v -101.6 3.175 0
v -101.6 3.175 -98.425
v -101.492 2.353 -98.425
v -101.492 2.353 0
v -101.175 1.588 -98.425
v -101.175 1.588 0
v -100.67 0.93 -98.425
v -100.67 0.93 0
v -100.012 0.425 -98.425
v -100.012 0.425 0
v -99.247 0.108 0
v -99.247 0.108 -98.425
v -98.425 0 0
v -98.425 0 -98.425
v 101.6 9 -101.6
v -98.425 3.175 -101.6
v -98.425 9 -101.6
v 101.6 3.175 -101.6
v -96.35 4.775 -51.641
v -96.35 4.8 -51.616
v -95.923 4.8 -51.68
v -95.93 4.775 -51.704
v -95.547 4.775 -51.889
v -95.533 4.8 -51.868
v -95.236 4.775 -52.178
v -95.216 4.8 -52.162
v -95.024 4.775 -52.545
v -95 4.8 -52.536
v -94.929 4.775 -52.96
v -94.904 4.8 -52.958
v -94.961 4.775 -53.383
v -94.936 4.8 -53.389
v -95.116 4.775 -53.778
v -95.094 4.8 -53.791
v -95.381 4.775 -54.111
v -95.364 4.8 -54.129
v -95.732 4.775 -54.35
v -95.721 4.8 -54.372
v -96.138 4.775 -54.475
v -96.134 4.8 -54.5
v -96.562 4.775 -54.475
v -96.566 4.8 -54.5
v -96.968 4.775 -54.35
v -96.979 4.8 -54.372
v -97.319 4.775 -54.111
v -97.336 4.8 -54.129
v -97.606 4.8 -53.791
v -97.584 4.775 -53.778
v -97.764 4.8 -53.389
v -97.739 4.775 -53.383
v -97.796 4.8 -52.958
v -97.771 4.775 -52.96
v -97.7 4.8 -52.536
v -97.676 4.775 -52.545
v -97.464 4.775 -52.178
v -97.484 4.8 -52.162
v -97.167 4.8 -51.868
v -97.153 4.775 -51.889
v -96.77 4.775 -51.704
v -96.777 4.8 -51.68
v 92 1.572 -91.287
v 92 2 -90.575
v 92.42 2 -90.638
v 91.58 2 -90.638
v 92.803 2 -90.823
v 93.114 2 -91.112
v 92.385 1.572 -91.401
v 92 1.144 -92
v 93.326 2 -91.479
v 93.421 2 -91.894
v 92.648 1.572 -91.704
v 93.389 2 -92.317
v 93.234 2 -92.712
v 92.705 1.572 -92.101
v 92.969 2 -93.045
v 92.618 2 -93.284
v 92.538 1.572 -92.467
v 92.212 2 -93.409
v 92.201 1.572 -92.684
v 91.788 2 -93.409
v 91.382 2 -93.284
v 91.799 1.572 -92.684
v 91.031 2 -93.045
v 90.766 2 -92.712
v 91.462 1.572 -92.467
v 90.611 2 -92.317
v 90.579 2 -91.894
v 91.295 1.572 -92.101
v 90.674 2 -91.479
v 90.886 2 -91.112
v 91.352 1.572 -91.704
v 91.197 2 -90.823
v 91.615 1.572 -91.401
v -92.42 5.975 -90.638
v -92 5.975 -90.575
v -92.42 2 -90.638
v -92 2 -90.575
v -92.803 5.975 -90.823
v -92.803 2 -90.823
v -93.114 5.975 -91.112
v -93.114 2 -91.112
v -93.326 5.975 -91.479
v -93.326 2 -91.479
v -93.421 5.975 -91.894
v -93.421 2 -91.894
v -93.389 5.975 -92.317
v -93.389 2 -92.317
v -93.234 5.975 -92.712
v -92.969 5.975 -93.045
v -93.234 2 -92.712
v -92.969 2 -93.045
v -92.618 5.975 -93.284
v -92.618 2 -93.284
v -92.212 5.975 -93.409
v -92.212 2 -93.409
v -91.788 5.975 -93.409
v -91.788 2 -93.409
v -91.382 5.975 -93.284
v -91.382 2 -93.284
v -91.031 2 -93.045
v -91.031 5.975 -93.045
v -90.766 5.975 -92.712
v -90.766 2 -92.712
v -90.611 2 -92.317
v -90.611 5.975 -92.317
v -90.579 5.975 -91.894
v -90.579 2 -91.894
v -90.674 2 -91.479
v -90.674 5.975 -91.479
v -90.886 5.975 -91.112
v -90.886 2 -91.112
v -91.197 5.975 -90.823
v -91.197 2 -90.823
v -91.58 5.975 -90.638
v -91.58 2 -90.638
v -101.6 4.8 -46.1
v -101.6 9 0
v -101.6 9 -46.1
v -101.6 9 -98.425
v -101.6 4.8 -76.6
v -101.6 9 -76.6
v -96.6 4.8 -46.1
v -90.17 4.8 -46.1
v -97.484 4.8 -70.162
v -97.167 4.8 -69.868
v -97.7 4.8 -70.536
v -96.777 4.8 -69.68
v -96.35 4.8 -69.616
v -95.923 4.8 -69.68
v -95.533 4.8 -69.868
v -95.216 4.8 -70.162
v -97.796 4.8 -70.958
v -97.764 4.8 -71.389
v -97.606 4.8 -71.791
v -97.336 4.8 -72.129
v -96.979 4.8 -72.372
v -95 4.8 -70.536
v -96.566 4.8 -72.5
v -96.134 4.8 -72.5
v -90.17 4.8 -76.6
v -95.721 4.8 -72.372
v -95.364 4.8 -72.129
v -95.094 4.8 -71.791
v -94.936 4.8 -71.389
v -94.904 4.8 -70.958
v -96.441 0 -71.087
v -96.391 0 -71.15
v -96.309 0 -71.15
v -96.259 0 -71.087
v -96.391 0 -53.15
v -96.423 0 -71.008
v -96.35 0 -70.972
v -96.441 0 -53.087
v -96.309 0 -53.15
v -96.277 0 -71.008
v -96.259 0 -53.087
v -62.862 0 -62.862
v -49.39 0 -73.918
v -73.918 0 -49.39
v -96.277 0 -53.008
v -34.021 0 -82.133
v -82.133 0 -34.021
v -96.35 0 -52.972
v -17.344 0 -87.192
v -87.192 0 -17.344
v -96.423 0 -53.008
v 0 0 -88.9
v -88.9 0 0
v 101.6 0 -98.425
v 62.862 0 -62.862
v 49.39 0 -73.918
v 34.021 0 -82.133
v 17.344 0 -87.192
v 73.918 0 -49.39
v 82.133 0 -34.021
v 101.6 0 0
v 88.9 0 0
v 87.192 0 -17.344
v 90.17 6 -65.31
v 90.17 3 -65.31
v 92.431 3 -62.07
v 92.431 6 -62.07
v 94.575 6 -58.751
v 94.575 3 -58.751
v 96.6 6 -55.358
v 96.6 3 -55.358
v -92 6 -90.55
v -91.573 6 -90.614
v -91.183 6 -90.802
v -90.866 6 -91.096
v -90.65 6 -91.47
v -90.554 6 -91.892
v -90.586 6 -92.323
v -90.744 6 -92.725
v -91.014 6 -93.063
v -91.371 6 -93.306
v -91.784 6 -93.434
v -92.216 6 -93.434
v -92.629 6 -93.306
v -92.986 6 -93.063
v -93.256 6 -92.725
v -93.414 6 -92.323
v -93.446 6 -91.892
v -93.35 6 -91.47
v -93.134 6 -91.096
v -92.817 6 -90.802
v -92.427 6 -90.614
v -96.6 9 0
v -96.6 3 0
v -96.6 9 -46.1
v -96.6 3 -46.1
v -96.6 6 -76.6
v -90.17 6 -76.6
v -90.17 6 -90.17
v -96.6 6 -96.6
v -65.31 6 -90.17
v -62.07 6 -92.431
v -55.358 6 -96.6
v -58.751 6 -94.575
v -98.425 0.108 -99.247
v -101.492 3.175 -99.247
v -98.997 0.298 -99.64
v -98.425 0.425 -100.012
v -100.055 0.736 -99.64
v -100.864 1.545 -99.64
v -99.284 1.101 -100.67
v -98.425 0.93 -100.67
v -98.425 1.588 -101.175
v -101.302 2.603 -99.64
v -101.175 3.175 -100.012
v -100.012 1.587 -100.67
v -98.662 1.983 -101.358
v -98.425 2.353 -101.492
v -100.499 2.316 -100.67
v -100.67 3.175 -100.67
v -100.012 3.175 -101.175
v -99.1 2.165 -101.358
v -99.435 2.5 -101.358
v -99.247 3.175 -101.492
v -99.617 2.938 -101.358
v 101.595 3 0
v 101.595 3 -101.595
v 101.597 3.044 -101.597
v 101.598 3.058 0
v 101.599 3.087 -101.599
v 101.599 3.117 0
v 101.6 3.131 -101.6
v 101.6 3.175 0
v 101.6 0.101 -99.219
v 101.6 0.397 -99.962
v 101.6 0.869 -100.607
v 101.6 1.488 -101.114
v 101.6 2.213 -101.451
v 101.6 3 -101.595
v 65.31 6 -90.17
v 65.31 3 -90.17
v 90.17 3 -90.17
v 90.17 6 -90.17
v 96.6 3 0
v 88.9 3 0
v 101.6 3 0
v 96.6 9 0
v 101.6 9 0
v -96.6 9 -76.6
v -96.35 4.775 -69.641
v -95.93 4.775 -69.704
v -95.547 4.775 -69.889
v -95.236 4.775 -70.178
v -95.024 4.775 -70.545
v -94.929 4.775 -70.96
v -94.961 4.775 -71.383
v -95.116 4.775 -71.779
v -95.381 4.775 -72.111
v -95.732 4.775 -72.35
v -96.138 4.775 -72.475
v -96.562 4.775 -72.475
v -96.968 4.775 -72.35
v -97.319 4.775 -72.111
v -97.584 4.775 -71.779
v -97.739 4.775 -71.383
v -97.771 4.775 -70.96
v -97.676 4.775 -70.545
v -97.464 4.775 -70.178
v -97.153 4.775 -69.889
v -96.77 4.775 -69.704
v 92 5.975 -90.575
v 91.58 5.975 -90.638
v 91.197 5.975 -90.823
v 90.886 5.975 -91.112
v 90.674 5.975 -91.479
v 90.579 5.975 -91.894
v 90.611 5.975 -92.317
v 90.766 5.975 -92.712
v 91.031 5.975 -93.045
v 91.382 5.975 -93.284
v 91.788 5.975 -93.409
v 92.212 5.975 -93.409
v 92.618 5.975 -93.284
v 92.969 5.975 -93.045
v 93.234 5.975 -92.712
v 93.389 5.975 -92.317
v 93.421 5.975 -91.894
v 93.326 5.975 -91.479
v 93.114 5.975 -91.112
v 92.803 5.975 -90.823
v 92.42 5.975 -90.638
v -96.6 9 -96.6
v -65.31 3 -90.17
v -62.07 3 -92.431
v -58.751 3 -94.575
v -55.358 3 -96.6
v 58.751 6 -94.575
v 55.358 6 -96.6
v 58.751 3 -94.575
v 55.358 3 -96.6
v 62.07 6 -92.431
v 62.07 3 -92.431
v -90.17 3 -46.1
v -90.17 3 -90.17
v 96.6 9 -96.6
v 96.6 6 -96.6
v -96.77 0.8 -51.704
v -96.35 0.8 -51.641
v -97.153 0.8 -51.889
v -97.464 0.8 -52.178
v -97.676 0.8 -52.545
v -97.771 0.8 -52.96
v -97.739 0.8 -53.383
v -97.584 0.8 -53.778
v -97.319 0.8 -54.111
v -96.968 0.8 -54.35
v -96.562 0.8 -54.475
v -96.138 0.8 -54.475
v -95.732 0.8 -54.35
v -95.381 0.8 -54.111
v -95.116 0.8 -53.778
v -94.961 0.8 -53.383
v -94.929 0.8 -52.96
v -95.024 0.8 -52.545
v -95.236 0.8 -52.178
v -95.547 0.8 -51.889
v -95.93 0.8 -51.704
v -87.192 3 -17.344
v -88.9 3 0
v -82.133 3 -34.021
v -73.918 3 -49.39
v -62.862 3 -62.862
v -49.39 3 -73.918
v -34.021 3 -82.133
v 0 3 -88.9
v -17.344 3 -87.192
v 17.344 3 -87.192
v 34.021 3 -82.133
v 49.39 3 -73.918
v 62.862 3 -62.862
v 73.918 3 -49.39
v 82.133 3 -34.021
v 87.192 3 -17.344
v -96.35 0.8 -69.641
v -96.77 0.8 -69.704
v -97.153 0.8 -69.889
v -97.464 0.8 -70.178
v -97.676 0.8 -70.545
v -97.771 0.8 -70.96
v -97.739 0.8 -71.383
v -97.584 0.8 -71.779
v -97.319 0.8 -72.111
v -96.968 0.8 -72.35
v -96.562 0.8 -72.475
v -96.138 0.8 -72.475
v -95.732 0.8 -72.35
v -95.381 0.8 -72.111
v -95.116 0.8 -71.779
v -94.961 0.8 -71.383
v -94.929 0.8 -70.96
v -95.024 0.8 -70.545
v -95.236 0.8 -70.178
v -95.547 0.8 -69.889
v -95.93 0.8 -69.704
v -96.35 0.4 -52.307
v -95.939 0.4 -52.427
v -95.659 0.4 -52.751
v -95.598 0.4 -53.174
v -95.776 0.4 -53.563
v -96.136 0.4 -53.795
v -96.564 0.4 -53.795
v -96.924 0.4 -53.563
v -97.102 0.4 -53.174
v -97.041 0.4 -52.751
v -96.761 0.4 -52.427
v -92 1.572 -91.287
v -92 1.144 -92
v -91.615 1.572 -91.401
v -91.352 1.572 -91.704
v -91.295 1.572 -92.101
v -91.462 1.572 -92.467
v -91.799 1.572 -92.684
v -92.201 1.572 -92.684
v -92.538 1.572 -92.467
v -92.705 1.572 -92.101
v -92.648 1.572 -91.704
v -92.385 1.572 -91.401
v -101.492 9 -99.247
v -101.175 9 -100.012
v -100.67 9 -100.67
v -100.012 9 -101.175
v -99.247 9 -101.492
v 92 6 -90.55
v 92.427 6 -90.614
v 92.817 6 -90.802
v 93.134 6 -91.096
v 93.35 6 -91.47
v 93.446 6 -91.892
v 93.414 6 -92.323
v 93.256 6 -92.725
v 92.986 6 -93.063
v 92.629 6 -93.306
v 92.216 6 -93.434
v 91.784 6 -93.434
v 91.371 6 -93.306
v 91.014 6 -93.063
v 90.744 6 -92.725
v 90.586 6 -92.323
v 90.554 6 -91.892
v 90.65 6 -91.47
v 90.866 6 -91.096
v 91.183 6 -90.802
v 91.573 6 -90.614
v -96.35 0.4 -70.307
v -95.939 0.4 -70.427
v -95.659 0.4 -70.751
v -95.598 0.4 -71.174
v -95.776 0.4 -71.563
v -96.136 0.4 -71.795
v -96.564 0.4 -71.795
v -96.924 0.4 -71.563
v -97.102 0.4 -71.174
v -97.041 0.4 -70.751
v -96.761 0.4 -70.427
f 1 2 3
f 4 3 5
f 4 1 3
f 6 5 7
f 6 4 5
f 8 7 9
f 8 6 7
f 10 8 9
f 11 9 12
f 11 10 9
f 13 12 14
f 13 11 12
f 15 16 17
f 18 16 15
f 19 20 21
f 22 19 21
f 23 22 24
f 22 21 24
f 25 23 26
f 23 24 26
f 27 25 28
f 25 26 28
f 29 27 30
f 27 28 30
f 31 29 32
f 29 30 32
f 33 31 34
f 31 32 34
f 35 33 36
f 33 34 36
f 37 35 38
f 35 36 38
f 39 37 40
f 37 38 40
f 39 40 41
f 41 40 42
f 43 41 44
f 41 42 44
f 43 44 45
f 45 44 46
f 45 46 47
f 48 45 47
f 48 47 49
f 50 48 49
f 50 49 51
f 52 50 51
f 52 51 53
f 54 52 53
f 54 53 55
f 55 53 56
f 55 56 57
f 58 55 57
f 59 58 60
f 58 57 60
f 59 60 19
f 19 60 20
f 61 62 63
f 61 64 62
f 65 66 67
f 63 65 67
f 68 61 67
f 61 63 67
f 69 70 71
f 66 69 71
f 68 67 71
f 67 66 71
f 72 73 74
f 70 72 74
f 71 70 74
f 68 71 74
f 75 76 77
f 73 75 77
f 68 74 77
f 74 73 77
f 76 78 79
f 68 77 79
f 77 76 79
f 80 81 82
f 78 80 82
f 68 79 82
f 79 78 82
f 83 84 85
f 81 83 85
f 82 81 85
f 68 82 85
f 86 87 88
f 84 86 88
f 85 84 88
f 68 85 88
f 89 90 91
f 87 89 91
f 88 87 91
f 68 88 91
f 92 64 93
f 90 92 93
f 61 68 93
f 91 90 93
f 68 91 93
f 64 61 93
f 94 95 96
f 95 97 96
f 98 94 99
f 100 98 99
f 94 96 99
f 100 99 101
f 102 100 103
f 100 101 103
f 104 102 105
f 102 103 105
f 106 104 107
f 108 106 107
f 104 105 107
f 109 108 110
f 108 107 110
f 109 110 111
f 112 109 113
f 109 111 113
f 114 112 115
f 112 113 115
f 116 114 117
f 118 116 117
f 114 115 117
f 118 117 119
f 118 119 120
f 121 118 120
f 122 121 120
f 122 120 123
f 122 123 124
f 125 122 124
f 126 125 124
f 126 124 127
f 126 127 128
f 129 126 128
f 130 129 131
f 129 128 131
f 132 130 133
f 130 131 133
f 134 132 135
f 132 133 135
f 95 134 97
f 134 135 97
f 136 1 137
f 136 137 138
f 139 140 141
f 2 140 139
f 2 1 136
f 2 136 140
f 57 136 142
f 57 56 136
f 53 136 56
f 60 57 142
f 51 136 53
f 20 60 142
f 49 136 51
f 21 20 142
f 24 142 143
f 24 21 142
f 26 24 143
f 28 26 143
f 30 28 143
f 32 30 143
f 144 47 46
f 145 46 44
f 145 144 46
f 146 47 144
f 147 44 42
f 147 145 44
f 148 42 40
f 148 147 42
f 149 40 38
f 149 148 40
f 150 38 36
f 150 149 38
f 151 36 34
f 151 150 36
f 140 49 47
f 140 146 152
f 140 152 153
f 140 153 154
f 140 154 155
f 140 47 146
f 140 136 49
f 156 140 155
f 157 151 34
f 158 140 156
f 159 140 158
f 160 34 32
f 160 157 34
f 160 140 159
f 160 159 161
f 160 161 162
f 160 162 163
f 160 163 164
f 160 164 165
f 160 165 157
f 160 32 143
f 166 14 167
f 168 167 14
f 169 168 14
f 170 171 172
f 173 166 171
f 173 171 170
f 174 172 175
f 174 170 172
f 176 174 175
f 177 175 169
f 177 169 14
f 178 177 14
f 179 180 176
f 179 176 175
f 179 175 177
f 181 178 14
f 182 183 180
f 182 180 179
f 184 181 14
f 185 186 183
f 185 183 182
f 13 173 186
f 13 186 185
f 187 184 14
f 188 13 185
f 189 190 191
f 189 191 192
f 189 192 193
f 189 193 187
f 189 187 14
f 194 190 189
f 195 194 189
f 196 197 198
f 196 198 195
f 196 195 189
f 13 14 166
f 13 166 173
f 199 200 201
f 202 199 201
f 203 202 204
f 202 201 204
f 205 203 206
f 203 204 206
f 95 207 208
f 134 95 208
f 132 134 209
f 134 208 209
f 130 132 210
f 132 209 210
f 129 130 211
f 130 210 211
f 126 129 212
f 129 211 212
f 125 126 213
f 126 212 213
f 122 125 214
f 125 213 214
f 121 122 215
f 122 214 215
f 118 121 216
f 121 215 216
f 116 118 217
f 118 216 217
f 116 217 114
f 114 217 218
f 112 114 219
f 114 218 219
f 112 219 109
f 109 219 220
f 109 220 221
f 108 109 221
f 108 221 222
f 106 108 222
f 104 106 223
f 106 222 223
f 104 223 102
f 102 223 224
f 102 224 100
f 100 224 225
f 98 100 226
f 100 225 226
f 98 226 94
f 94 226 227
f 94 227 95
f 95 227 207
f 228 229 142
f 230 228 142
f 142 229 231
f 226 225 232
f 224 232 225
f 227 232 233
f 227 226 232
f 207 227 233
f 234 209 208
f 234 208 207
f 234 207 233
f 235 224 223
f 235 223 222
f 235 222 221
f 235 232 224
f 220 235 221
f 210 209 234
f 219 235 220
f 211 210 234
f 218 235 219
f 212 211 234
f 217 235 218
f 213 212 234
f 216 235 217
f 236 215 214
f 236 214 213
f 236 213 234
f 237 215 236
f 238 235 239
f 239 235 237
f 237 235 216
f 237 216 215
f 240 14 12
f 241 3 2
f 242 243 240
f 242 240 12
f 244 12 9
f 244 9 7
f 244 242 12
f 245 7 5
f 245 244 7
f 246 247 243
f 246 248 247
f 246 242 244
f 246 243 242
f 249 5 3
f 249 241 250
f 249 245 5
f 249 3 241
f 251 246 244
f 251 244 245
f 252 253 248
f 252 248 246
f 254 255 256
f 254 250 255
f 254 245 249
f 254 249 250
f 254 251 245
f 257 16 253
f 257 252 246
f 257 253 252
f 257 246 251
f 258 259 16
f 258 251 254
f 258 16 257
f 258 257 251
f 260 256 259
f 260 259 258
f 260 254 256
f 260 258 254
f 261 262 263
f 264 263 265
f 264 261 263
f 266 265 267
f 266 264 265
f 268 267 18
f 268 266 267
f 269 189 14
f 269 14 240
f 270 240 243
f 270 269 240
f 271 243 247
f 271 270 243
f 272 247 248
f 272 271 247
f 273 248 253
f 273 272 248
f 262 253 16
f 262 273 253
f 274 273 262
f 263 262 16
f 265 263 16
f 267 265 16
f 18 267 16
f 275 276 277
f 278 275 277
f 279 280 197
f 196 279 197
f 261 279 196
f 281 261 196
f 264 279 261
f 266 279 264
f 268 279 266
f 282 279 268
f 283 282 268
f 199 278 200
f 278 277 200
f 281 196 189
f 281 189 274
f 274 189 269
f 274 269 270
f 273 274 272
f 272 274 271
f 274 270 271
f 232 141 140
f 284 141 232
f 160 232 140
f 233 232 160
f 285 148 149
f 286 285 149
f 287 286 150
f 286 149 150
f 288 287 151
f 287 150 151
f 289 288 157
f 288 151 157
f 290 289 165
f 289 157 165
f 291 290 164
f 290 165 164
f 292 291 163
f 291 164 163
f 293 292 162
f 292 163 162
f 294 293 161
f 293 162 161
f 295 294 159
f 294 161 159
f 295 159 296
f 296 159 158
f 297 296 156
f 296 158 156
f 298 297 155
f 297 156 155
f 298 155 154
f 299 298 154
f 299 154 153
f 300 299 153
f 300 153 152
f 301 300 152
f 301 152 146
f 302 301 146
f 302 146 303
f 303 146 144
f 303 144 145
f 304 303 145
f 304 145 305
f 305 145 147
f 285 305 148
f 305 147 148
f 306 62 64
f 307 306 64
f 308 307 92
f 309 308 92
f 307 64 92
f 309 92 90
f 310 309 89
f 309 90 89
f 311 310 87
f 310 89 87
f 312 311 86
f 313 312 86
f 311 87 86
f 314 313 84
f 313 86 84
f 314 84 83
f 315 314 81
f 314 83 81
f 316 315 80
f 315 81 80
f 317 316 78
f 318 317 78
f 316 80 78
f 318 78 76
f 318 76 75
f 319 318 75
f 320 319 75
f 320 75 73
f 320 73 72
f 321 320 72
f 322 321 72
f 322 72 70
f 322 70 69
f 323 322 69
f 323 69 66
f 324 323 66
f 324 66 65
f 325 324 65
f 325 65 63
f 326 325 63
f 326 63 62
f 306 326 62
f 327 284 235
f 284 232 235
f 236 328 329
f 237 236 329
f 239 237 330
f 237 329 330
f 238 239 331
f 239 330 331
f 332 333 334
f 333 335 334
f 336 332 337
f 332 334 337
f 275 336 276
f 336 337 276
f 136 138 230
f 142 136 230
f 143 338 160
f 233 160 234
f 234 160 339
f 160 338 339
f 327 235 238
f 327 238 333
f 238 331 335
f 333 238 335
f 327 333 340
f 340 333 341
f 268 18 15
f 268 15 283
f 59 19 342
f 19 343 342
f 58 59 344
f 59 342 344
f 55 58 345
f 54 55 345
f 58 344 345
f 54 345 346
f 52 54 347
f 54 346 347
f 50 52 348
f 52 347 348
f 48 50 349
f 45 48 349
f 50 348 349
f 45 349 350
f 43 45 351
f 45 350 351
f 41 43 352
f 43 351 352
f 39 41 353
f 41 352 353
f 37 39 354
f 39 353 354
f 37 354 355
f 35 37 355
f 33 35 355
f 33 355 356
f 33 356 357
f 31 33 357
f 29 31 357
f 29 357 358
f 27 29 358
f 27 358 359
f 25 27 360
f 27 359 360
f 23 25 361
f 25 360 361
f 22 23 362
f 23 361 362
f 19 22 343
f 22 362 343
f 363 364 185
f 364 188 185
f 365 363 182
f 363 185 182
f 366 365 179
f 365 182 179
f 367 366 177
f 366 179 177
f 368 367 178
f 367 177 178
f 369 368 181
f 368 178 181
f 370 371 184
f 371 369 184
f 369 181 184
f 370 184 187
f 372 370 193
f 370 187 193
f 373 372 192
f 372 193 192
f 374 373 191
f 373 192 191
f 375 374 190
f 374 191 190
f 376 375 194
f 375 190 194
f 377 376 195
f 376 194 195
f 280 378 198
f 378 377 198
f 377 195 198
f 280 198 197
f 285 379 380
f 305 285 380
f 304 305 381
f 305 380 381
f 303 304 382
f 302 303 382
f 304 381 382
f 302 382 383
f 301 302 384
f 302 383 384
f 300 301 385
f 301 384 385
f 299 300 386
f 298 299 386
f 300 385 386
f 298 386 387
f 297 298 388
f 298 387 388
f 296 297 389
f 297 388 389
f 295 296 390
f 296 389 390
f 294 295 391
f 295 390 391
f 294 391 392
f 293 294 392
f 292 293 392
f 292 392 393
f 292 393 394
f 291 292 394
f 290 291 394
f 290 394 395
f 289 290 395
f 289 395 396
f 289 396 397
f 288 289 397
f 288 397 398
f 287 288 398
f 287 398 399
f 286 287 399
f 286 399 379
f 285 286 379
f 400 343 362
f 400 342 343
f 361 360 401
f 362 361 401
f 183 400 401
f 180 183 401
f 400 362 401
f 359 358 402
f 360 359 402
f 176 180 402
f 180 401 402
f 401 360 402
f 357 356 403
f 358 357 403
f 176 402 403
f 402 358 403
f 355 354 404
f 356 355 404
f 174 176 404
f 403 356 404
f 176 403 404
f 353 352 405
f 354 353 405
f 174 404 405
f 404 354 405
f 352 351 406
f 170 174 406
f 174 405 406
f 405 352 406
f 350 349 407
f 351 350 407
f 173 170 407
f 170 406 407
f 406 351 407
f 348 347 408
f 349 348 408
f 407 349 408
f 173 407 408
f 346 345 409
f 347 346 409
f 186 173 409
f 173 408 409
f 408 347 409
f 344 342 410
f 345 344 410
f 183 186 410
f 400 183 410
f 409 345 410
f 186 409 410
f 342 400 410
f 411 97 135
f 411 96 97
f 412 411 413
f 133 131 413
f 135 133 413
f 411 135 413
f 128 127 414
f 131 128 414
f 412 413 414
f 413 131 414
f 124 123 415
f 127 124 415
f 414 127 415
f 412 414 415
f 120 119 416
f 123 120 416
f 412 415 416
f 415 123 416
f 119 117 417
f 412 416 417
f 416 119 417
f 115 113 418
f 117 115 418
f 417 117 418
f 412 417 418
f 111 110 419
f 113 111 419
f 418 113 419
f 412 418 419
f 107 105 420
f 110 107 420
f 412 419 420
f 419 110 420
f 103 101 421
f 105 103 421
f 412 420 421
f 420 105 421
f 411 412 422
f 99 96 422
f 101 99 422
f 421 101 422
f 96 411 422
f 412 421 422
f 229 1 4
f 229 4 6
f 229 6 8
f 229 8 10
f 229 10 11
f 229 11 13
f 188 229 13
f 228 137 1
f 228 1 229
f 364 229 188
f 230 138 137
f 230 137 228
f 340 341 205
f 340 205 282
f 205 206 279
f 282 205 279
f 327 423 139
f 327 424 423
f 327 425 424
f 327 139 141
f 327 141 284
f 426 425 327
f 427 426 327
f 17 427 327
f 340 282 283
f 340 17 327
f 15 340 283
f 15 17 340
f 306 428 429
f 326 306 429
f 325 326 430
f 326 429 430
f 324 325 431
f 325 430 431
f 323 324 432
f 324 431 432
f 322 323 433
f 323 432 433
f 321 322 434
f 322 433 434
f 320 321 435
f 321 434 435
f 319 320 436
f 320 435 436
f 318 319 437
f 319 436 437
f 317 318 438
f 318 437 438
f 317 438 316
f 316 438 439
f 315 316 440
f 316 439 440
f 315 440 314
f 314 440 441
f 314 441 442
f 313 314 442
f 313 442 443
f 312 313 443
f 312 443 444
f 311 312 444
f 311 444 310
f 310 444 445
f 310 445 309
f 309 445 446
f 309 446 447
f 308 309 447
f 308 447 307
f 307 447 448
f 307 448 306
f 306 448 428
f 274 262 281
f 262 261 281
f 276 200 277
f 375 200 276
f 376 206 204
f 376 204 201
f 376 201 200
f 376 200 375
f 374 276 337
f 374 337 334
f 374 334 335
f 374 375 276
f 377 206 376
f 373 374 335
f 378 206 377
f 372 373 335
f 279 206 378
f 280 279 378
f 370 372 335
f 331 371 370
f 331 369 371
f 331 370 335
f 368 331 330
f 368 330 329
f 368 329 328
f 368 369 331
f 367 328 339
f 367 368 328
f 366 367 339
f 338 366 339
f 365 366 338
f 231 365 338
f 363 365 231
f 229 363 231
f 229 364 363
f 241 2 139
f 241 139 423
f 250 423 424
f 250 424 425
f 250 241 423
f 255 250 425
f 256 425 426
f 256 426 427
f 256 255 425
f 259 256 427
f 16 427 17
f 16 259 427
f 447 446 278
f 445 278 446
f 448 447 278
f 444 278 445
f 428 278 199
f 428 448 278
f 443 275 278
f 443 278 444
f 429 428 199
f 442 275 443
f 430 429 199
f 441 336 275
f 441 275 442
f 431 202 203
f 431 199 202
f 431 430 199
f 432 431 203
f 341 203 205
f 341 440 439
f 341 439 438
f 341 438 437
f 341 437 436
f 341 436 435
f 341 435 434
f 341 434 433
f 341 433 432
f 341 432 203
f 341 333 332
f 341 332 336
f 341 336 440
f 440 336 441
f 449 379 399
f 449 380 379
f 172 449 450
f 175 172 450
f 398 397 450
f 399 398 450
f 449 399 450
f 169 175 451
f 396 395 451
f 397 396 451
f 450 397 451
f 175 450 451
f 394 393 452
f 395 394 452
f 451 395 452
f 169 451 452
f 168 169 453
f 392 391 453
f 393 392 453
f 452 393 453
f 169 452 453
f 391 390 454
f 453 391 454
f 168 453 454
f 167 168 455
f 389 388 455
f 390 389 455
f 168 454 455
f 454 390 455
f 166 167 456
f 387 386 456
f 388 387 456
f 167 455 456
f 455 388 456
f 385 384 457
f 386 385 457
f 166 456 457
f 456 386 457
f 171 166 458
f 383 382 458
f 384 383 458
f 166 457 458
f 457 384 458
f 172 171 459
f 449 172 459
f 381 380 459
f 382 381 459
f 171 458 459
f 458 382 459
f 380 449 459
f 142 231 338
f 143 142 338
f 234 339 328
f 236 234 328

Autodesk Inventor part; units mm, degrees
ref_plane "YZ Plane" through (0, 0, 0) normal (1, 0, 0) x (0, 1, 0)
ref_plane "XZ Plane" through (0, 0, 0) normal (0, 1, 0) x (-1, 0, 0)
ref_plane "XY Plane" through (0, 0, 0) normal (0, 0, 1) x (1, 0, 0)
sketch "Sketch1" plane through (0, 0, 0) normal (0, 1, 0) x (-1, 0, 0)
  line L0 (101.6, -101.6) -> (-101.6, -101.6)
  line L1 (-101.6, -101.6) -> (-101.6, 101.6)
  line L2 (-101.6, 101.6) -> (101.6, 101.6)
  line L3 (101.6, 101.6) -> (101.6, -101.6)
  line L4 (96.6, -96.6) -> (-96.6, -96.6)
  line L5 (-96.6, -96.6) -> (-96.6, 96.6)
  line L6 (-96.6, 96.6) -> (96.6, 96.6)
  line L7 (96.6, 96.6) -> (96.6, -96.6)
  line L8 (101.6, 101.6) -> (-40.4, 101.6)
  circle A0 centre (0, 0) radius 88.9
  circle A1 centre (0, 0) radius 109.3376
  line L9 (-40.4, 101.6) -> (-101.6, 40.4)
  line L10 (-45.4, 101.6) -> (-101.6, 45.4)
  line L11 (96.6, 96.6) -> (96.6, 101.6)
  line L12 (-45.4, 101.6) -> (-35.4, 101.6)
  line L13 (-35.4, 101.6) -> (-35.4, 96.6)
  line L14 (-35.4, 96.6) -> (-45.4, 96.6)
  line L15 (-45.4, 96.6) -> (-45.4, 101.6)
  circle A2 centre (0, 0) radius 111.3376
  point P0 (96.6, 51.2168)
  point P1 (101.6, 40.4)
  point P2 (101.6, -40.4)
  point P3 (96.6, -51.2168)
  point P4 (-96.6, 45.4)
  point P5 (-45.4, 96.6)
  dimension "d0" = 203.2
  dimension "d1" = 203.2
  dimension "d2" = 101.6
  dimension "d3" = 101.6
  dimension "d4" = 5
  dimension "d5" = 5
  dimension "d6" = 5
  dimension "d7" = 5
  dimension "d10" = 142
  dimension "d12" = 61.2
  dimension "d14" = 177.8
  dimension "d15" = 5
  dimension "d16" = 5
  dimension "d17" = 10
  dimension "d34" = 2
extrude "Extrusion1" add sketch "Sketch1" along normal blind 3 contours L0 A2 L4 L7 L3 | L0 A1 L4 A2 | A2 L7 A1 L3 | L0 A1 L4 | A2 L4 A1 L0 | L0 L1 A2 L5 L4 | A2 L7 L4 | L4 A1 L7 A2 | A1 L7 L3 | L4 A1 L5 L9 L6 L7 | A2 L5 A1 L4 | L4 L5 A2 | A1 L7 A2 L3 | A2 L7 L11 L2 L3 | L1 A1 L5 A2 | A1 L6 A2 L7 | A2 L6 L7 | A1 L1 L9 L5 | A1 L2 A2 L6 | L6 L13 L2 A1 | L11 L6 A2 L2 | L9 A1 L10 L5 | L5 L10 L6 L9 | L1 L10 A1 | L6 L9 L2 L13 | L15 A1 L9 | L6 L10 A1 L15 | A1 L15 L2 | A1 L10 L15
sketch "Sketch5" plane through (0, 3, 0) normal (0, 1, 0) x (1, 0, 0)
  line L0 (-101.6, 101.6) -> (101.6, 101.6)
  line L1 (101.6, 101.6) -> (101.6, -101.6)
  line L2 (101.6, -101.6) -> (-101.6, -101.6)
  line L3 (-101.6, -101.6) -> (-101.6, 101.6)
  line L4 (-96.6, 96.6) -> (96.6, 96.6)
  line L5 (96.6, 96.6) -> (96.6, -96.6)
  line L6 (96.6, -96.6) -> (-96.6, -96.6)
  line L7 (-96.6, -96.6) -> (-96.6, 96.6)
  line L8 (-101.6, -101.6) -> (40.4, -101.6)
  circle A0 centre (0, 0) radius 88.9
  circle A1 centre (0, 0) radius 109.3376
  line L9 (40.4, -101.6) -> (101.6, -40.4)
  line L10 (45.4, -101.6) -> (101.6, -45.4)
  line L11 (-96.6, -96.6) -> (-96.6, -101.6)
  line L12 (45.4, -101.6) -> (35.4, -101.6)
  line L13 (35.4, -101.6) -> (35.4, -96.6)
  line L14 (35.4, -96.6) -> (45.4, -96.6)
  line L15 (45.4, -96.6) -> (45.4, -101.6)
  circle A2 centre (0, 0) radius 111.3376
  point P0 (96.6, 101.6)
  point P1 (96.6, 51.2168)
  point P2 (101.6, 40.4)
  point P3 (101.6, -40.4)
  point P4 (96.6, -51.2168)
  point P5 (-96.6, 45.4)
  point P6 (-45.4, 96.6)
  point P7 (-35.4, 101.6)
  point P8 (-55.358, -96.6)
  point P9 (-96.6, -55.358)
  point P10 (-96.6, 55.358)
  point P11 (-55.358, 96.6)
  point P12 (55.358, 96.6)
  point P13 (96.6, 55.358)
  point P14 (96.6, -45.4)
  point P15 (45.4, -96.6)
  dimension "d37" = 203.2
  dimension "d38" = 203.2
  dimension "d39" = 101.6
  dimension "d40" = 101.6
  dimension "d41" = 5
  dimension "d42" = 5
  dimension "d43" = 5
  dimension "d44" = 5
  dimension "d45" = 142
  dimension "d46" = 61.2
  dimension "d47" = 177.8
  dimension "d48" = 5
  dimension "d49" = 5
  dimension "d50" = 10
  dimension "d51" = 2
extrude "Extrusion4" add sketch "Sketch5" along normal blind 3 contours L0 A2 L4 L7 L3 | L0 A1 L4 A2 | A2 L7 A1 L3 | L0 A1 L4 | A2 L4 A1 L0 | L0 L1 A2 L5 L4 | A2 L7 L4 | A1 L7 L3 | A2 L7 L11 L2 L3 | L3 A1 L7 A2 | L4 L5 A2 | A2 L6 L7 | L1 A1 L5 A2 | L11 L6 A2 L2 | L6 A1 L2 A2 | A1 L1 L9 L5 | L6 L13 L2 A1 | L9 A1 L10 L5 | L5 L10 L6 L9 | L1 L10 A1 | L6 L9 L2 L13 | L15 A1 L9 | L6 L10 A1 L15 | A1 L15 L2 | L15 A1 L10
sketch "Sketch6" plane through (0, 6, 0) normal (0, 1, 0) x (1, 0, 0)
  line L0 (-101.6, 101.6) -> (101.6, 101.6)
  line L1 (101.6, 101.6) -> (101.6, -101.6)
  line L2 (101.6, -101.6) -> (-101.6, -101.6)
  line L3 (-101.6, -101.6) -> (-101.6, 101.6)
  line L4 (-96.6, 96.6) -> (96.6, 96.6)
  line L5 (96.6, 96.6) -> (96.6, -96.6)
  line L6 (96.6, -96.6) -> (-96.6, -96.6)
  line L7 (-96.6, -96.6) -> (-96.6, 96.6)
  line L8 (-101.6, -101.6) -> (40.4, -101.6)
  circle A0 centre (0, 0) radius 88.9
  circle A1 centre (0, 0) radius 109.3376
  line L9 (40.4, -101.6) -> (101.6, -40.4)
  line L10 (45.4, -101.6) -> (101.6, -45.4)
  line L11 (-96.6, -96.6) -> (-96.6, -101.6)
  line L12 (45.4, -101.6) -> (35.4, -101.6)
  line L13 (35.4, -101.6) -> (35.4, -96.6)
  line L14 (35.4, -96.6) -> (45.4, -96.6)
  line L15 (45.4, -96.6) -> (45.4, -101.6)
  circle A2 centre (0, 0) radius 111.3376
  point P0 (96.6, 101.6)
  point P1 (96.6, 51.2168)
  point P2 (101.6, 40.4)
  point P3 (101.6, -40.4)
  point P4 (96.6, -51.2168)
  point P5 (-96.6, 45.4)
  point P6 (-45.4, 96.6)
  point P7 (-35.4, 101.6)
  point P8 (55.358, 96.6)
  point P9 (96.6, 55.358)
  point P10 (96.6, -45.4)
  point P11 (45.4, -96.6)
  dimension "d54" = 203.2
  dimension "d55" = 203.2
  dimension "d56" = 101.6
  dimension "d57" = 101.6
  dimension "d58" = 5
  dimension "d59" = 5
  dimension "d60" = 5
  dimension "d61" = 5
  dimension "d62" = 142
  dimension "d63" = 61.2
  dimension "d64" = 177.8
  dimension "d65" = 5
  dimension "d66" = 5
  dimension "d67" = 10
  dimension "d68" = 2
extrude "Extrusion5" add sketch "Sketch6" along normal blind 3 contours L0 A2 L4 L7 L3 | L0 A1 L4 A2 | A2 L7 A1 L3 | L0 A1 L4 | A2 L4 A1 L0 | L0 L1 A2 L5 L4 | A1 L7 L3 | A2 L7 L11 L2 L3 | L3 A1 L7 A2 | L1 A1 L5 A2 | L11 L6 A2 L2 | L6 A1 L2 A2 | A1 L1 L9 L5 | L6 L13 L2 A1 | L9 A1 L10 L5 | L5 L10 L6 L9 | L1 L10 A1 | L6 L9 L2 L13 | L15 A1 L9 | L6 L10 A1 L15 | A1 L15 L2 | L15 A1 L10
fillet "Fillet6" radius 3.175 5 edges at (-28.1, 0, 101.6) (73.5, 0, 73.5) (101.6, 0, -28.1) (0, 0, -101.6) (-101.6, 0, 0)
sketch "Sketch7" plane through (0, 0, 0) normal (0, -1, 0) x (1, 0, 0)
  line L0 (101.6, 45.4) -> (101.6, -101.6) projected
  line L1 (98.425, 44.0849) -> (98.425, -98.425) projected
  line L2 (101.6, -101.6) -> (98.425, -101.6)
  line L3 (98.425, -101.6) -> (98.425, 41.0849)
  line L4 (98.425, 41.0849) -> (101.6, 41.0849)
  line L5 (101.6, 41.0849) -> (101.6, -101.6)
  line L6 (44.0849, 98.425) -> (98.425, 44.0849) projected
  line L7 (98.425, 44.0849) -> (101.6, 44.0849)
  point P0 (0, 0)
  point P1 (101.6, 41.0849)
  dimension "d73" = 3
extrude "Extrusion6" add sketch "Sketch7" against normal blind 3 contours L0 L2 L3 L1 L4
fillet "Fillet7" radius 3.175 1 edges at (100.0125, 0, -101.6)
fillet "Fillet8" radius 3.175 4 edges at (-100.6701, 0.9299, 100.6701) (-101.6, 6.0875, 101.6) (-100.6701, 0.9299, -100.6701) (-101.6, 6.0875, -101.6)
fillet "Fillet9" radius 3.175 4 edges at (100.6701, 0.9299, 45.0148) (101.6, 6.0875, 45.4) (45.0148, 0.9299, 100.6701) (45.4, 6.0875, 101.6)
sketch "Sketch11" plane through (0, 3, 0) normal (0, 1, 0) x (1, 0, 0)
  arc A0 (-101.6, -98.425) -> (-98.425, -101.6) centre (-98.425, -98.425) ccw
  line L0 (44.0849, 101.6) -> (-98.425, 101.6)
  line L1 (-101.6, 98.425) -> (-101.6, -98.425)
  line L2 (-101.6, -46.1) -> (-101.6, -76.6)
  line L3 (-96.6, -96.6) -> (-96.6, 96.6)
  line L4 (-96.6, -46.1) -> (-96.6, -76.6)
  line L5 (-101.6, -76.6) -> (-96.6, -76.6)
  line L6 (-101.6, -46.1) -> (-96.6, -46.1)
  line L7 (-98.425, -101.6) -> (101.6, -101.6)
  line L8 (0, 0) -> (-101.6, 0)
  line L9 (-101.6, 46.1) -> (-101.6, 76.6)
  line L10 (-96.6, 46.1) -> (-96.6, 76.6)
  line L11 (-101.6, 76.6) -> (-96.6, 76.6)
  line L12 (-101.6, 46.1) -> (-96.6, 46.1)
  line L13 (-96.6, -76.6) -> (-90.1, -76.6)
  line L14 (-90.1, -76.6) -> (-90.1, -46.1)
  line L15 (-90.1, -46.1) -> (-96.6, -46.1)
  line L16 (-96.6, -46.1) -> (-96.6, -76.6)
  line L17 (-96.6, 46.1) -> (-90.1, 46.1)
  line L18 (-90.1, 46.1) -> (-90.1, 76.6)
  line L19 (-90.1, 76.6) -> (-96.6, 76.6)
  line L20 (-96.6, 76.6) -> (-96.6, 46.1)
  point P0 (-98.425, 98.425)
  point P1 (46.1, 101.6)
  point P2 (46.1, 96.6)
  point P3 (76.6, 96.6)
  point P4 (76.6, 101.6)
  point P5 (-46.1, 96.6)
  point P6 (-96.6, -46.1)
  point P7 (-101.6, 46.1)
  point P8 (-96.6, 46.1)
  point P9 (-96.6, 76.6)
  point P10 (-101.6, 76.6)
  point P11 (-96.6, 76.6)
  dimension "d97" = 30.5
  dimension "d98" = 25
  dimension "d99" = 5
  dimension "d100" = 6.5
  dimension "d101" = 6.5
extrude "Extrusion8" add sketch "Sketch11" along normal up to surface (3 mm away) contours L19 L18 L17 L3 | L15 L14 L13 L3
sketch "Sketch8" plane through (0, 9, 0) normal (0, 1, 0) x (1, 0, 0)
  arc A0 (-101.6, -98.425) -> (-98.425, -101.6) centre (-98.425, -98.425) ccw
  line L0 (44.0849, 101.6) -> (-98.425, 101.6)
  line L1 (-101.6, 98.425) -> (-101.6, -98.425)
  line L2 (-101.6, -46.1) -> (-101.6, -76.6)
  line L3 (-96.6, -96.6) -> (-96.6, 96.6)
  line L4 (-96.6, -46.1) -> (-96.6, -76.6)
  line L5 (-101.6, -76.6) -> (-96.6, -76.6)
  line L6 (-101.6, -46.1) -> (-96.6, -46.1)
  line L7 (-98.425, -101.6) -> (101.6, -101.6)
  line L8 (0, 0) -> (-101.6, 0)
  line L9 (-101.6, 46.1) -> (-101.6, 76.6)
  line L10 (-96.6, 46.1) -> (-96.6, 76.6)
  line L11 (-101.6, 76.6) -> (-96.6, 76.6)
  line L12 (-101.6, 46.1) -> (-96.6, 46.1)
  line L13 (-96.6, -76.6) -> (-90.1, -76.6)
  line L14 (-90.1, -76.6) -> (-90.1, -46.1)
  line L15 (-90.1, -46.1) -> (-96.6, -46.1)
  line L16 (-96.6, -46.1) -> (-96.6, -76.6)
  line L17 (-96.6, 46.1) -> (-90.1, 46.1)
  line L18 (-90.1, 46.1) -> (-90.1, 76.6)
  line L19 (-90.1, 76.6) -> (-96.6, 76.6)
  line L20 (-96.6, 76.6) -> (-96.6, 46.1)
  point P0 (-98.425, 98.425)
  point P1 (46.1, 101.6)
  point P2 (46.1, 96.6)
  point P3 (76.6, 96.6)
  point P4 (76.6, 101.6)
  point P5 (-46.1, 96.6)
  point P6 (-96.6, -46.1)
  point P7 (-101.6, 46.1)
  point P8 (-96.6, 46.1)
  point P9 (-96.6, 76.6)
  point P10 (-101.6, 76.6)
  point P11 (-96.6, 76.6)
  dimension "d77" = 30.5
  dimension "d78" = 25
  dimension "d79" = 5
  dimension "d82" = 6.5
  dimension "d83" = 6.5
extrude "Extrusion7" cut sketch "Sketch8" against normal blind 4.2 contours L11 L3 L12 L1 | L19 L18 L17 L3 | L6 L3 L5 L1 | L15 L14 L13 L3
sketch "Sketch10" plane through (0, 4.8, 0) normal (0, 1, 0) x (1, 0, 0)
  line L0 (-90.1, -76.6) -> (-90.1, -46.1)
  line L1 (-101.6, -46.1) -> (-96.6, -46.1)
  line L2 (-90.1, -76.6) -> (-90.1, -46.1)
  line L3 (-90.1, -46.1) -> (-101.6, -46.1)
  line L4 (-101.6, -46.1) -> (-101.6, -76.6)
  line L5 (-101.6, -76.6) -> (-90.1, -76.6)
  line L6 (-96.6, -76.6) -> (-90.1, -76.6)
  line L7 (-91.1, -76.6) -> (-91.1, -46.1)
  line L8 (-91.1, -62.066) -> (-96.35, -62.066)
  line L9 (-96.35, -62.066) -> (-96.35, -71.066)
  line L10 (-96.35, -62.066) -> (-96.35, -53.066)
  circle A0 centre (-96.35, -53.066) radius 1
  circle A1 centre (-96.35, -71.066) radius 1
  line L11 (0, 0) -> (-101.6, 0)
  line L12 (-101.6, 98.425) -> (-101.6, -98.425)
  circle A2 centre (-96.35, 71.066) radius 1
  line L13 (-96.35, 62.066) -> (-96.35, 71.066)
  line L14 (-91.1, 62.066) -> (-96.35, 62.066)
  line L15 (-101.6, 76.6) -> (-90.1, 76.6)
  line L16 (-96.35, 62.066) -> (-96.35, 53.066)
  circle A3 centre (-96.35, 53.066) radius 1
  line L17 (-101.6, 46.1) -> (-96.6, 46.1)
  line L18 (-90.1, 46.1) -> (-101.6, 46.1)
  line L19 (-91.1, 76.6) -> (-91.1, 46.1)
  line L20 (-101.6, 46.1) -> (-101.6, 76.6)
  line L21 (-90.1, 76.6) -> (-90.1, 46.1)
  line L22 (-90.1, 76.6) -> (-90.1, 46.1)
  line L23 (-96.6, 76.6) -> (-90.1, 76.6)
  dimension "d84" = 1
  dimension "d85" = 5.25
  dimension "d86" = 9
  dimension "d87" = 9
  dimension "d88" = 2
  dimension "d89" = 2
hole "Hinge Holes" at (-96.35, 4.8, -71.066) at (-96.35, 4.8, -53.066) at (-96.35, 4.8, 71.066) at (-96.35, 4.8, 53.066) direction (0, -1, 0) diameter 2.85 depth 4 tip angle 118 countersink diameter 2.9 countersink angle 90 thread size "M3.5x0.6" class "6H" standard "ANSI Metric M Profile"
sketch "Sketch12" plane through (0, 6, 0) normal (0, 1, 0) x (1, 0, 0)
  line L0 (-92, 92) -> (92, 92)
  line L1 (92, 92) -> (92, -92)
  line L2 (92, -92) -> (-92, -92)
  line L3 (-92, -92) -> (-92, 92)
  circle A0 centre (-92, 92) radius 1
  circle A1 centre (92, 92) radius 1
  circle A2 centre (-92, -92) radius 1
  point P0 (0, 0)
  dimension "d104" = 92
  dimension "d105" = 92
  dimension "d106" = 92
  dimension "d107" = 92
  dimension "d108" = 2
  dimension "d109" = 2
  dimension "d110" = 2
hole "Assembly Holes" at (-92, 6, 92) at (-92, 6, -92) at (92, 6, -92) direction (0, -1, 0) diameter 2.85 depth 4 tip angle 118 countersink diameter 2.9 countersink angle 90 thread size "M3.5x0.6" class "6H" standard "ANSI Metric M Profile"
sketch "Sketch15" plane through (0, 3, 0) normal (0, 1, 0) x (1, 0, 0)
  line L0 (-90.17, 90.17) -> (90.17, 90.17)
  line L1 (90.17, 90.17) -> (90.17, -90.17)
  line L2 (90.17, -90.17) -> (-90.17, -90.17)
  line L3 (-90.17, -90.17) -> (-90.17, 90.17)
  line L4 (45.2687, -90.17) -> (90.17, -45.2687)
  point P0 (0, 0)
  dimension "d126" = 90.17
  dimension "d127" = 90.17
  dimension "d128" = 90.17
  dimension "d129" = 90.17
  dimension "d130" = 31.75
extrude "Extrusion9" cut sketch "Sketch15" along normal blind 10 contours L0 L1 L4 L2 L3
sketch "Sketch16" plane through (0, 9, 0) normal (0, 1, 0) x (1, 0, 0)
  line L0 (-101.6, -98.425) -> (-101.6, 98.425) projected
  line L1 (-101.6, 0) -> (101.6, 0)
  line L2 (101.6, 101.6) -> (101.6, -44.0849) projected
  point P0 (0, 0)
ref_plane "Work Plane1" through (-101.6, 9, 0) normal (0, 0, 1) x (1, 0, 0)
sketch "Sketch17" plane through (-101.6, 9, 0) normal (0, 0, 1) x (1, 0, 0)
  line L0 (-12.9177, 20.3635) -> (224.9268, 20.3635)
  line L1 (224.9268, 20.3635) -> (224.9268, -33.2249)
  line L2 (224.9268, -33.2249) -> (-12.9177, -33.2249)
  line L3 (-12.9177, -33.2249) -> (-12.9177, 20.3635)
  point P0 (101.6, -9)
extrude "Extrusion10" cut sketch "Sketch17" along normal blind 2540
equation "\"d1\" = d0"
equation "\"d2\" = 0.5 * d0"
equation "\"d3\" = 0.5 * d0"
equation "\"d38\" = d37"
equation "\"d39\" = 0.5 * d37"
equation "\"d40\" = 0.5 * d37"
properties part number "Box_Walls_2"
